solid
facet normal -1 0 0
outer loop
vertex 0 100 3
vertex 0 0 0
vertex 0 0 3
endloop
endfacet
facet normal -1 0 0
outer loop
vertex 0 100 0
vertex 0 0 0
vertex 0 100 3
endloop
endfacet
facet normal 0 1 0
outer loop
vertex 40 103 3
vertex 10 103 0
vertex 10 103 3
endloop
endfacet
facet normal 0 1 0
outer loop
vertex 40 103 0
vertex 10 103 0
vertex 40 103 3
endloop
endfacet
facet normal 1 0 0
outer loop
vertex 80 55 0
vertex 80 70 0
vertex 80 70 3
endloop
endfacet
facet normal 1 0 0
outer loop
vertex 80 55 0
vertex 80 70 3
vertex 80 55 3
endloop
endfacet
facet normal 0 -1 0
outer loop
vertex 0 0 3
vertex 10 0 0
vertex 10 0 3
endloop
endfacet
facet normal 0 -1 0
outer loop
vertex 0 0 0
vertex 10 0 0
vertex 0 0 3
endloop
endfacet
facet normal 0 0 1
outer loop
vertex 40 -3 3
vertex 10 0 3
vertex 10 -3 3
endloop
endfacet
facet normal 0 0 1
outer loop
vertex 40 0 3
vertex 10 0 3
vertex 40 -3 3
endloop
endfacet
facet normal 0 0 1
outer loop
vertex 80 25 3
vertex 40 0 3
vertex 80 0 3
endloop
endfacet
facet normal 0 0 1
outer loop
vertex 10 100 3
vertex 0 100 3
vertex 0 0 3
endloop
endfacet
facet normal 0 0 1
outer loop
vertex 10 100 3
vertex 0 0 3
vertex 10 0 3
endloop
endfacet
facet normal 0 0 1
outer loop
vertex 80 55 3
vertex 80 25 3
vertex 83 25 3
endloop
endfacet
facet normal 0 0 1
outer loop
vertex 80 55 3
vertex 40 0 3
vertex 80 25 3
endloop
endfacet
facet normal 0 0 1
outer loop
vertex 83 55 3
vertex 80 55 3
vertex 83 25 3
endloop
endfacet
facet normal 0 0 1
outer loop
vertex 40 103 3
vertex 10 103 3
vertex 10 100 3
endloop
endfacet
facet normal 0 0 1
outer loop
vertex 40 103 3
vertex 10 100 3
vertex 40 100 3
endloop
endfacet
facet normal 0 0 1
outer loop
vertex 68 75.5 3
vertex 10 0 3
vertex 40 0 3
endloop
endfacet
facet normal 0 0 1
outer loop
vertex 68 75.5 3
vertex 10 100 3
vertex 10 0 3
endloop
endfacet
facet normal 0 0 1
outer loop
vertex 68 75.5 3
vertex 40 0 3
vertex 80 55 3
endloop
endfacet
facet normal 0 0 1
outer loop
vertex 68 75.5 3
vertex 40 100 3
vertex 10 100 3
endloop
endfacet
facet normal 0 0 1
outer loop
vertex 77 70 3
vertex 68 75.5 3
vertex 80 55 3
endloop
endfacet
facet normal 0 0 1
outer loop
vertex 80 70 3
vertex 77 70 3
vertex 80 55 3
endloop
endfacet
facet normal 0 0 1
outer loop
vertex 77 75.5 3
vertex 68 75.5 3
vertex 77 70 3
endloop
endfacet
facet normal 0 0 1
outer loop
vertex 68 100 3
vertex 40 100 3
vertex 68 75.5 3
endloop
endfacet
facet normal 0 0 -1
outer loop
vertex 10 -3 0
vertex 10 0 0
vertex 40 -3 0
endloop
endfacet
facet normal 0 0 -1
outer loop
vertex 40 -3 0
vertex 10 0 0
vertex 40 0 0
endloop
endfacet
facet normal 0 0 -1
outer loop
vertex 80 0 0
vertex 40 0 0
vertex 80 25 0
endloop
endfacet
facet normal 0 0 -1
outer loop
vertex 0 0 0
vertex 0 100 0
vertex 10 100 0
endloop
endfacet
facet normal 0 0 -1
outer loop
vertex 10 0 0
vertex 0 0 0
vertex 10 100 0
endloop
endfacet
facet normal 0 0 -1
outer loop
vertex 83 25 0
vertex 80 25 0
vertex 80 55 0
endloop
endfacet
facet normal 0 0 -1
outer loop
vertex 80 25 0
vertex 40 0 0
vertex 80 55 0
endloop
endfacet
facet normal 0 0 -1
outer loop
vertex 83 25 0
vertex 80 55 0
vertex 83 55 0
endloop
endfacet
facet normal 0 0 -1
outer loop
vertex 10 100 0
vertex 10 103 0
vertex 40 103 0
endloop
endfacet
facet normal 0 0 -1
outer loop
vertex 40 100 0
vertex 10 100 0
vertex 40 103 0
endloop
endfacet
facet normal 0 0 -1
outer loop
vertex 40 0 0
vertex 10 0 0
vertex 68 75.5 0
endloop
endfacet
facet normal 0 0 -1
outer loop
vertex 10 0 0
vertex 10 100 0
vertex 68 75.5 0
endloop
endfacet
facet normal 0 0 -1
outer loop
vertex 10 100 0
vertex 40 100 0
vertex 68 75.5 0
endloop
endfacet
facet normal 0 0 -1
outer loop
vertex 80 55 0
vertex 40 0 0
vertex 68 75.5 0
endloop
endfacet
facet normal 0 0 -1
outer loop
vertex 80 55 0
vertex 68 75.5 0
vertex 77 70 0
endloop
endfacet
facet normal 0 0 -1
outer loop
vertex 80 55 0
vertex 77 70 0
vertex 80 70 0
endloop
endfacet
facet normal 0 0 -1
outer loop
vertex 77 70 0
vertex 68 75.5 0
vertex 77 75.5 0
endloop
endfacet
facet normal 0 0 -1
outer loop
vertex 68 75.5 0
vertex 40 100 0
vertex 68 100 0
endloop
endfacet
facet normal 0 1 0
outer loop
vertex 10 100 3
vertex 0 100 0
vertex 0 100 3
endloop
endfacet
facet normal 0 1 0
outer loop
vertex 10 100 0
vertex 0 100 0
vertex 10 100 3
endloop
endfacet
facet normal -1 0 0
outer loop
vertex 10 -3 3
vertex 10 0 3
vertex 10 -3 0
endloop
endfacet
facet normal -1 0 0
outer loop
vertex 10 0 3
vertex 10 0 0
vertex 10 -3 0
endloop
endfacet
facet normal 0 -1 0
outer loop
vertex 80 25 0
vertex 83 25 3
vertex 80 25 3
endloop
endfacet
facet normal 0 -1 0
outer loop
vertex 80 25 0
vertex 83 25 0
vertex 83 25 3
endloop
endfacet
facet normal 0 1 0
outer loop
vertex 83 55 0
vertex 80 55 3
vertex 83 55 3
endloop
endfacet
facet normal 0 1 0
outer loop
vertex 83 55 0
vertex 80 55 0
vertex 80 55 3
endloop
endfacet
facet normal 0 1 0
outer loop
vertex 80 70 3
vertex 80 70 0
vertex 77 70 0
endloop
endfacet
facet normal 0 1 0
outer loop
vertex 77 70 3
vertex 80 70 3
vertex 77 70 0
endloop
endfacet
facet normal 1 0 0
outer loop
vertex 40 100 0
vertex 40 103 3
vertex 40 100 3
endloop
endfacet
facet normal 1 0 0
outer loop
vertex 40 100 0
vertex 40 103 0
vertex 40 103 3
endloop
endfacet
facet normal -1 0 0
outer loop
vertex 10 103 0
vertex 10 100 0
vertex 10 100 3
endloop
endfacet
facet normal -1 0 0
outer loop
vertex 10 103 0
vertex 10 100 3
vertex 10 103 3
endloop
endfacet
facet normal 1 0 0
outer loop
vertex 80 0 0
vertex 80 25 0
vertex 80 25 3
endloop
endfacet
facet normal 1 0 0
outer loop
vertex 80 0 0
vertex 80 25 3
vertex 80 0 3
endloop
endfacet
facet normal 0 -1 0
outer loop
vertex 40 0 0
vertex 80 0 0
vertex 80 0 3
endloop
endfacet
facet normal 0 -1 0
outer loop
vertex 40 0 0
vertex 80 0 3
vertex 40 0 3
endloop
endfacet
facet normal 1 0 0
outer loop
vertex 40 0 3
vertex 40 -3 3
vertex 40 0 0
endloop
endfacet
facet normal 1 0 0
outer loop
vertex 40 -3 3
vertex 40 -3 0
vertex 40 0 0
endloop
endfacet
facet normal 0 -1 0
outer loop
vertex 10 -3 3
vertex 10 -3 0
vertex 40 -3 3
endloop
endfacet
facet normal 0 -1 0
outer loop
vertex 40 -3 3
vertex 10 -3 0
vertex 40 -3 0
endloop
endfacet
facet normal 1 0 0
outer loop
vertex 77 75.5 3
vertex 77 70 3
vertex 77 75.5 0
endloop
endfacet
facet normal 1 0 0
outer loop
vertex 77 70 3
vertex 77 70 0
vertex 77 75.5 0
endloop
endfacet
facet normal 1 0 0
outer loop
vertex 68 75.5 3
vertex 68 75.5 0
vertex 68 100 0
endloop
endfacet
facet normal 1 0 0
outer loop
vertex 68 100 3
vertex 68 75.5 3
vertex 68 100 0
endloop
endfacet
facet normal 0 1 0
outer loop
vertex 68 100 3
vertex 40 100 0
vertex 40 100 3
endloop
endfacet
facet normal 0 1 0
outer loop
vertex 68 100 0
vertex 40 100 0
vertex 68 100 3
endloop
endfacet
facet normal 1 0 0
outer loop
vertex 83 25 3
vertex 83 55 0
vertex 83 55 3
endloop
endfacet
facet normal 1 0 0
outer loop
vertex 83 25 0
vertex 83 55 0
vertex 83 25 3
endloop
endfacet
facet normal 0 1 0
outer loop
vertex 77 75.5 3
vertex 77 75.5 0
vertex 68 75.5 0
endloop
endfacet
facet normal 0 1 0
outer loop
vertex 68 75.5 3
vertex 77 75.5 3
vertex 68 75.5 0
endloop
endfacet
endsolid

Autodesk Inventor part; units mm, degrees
ref_plane "YZ Plane" through (0, 0, 0) normal (1, 0, 0) x (0, 1, 0)
ref_plane "XZ Plane" through (0, 0, 0) normal (0, 1, 0) x (-1, 0, 0)
ref_plane "XY Plane" through (0, 0, 0) normal (0, 0, 1) x (1, 0, 0)
sketch "Boceto1" plane through (0, 0, 0) normal (0, 0, 1) x (1, 0, 0)
  line L0 (0, 0) -> (0, 100)
  line L1 (80, 55) -> (83, 55)
  line L2 (83, 55) -> (83, 25)
  line L3 (83, 25) -> (80, 25)
  line L4 (80, 70) -> (80, 55)
  line L5 (80, 25) -> (80, 0)
  line L6 (10, 100) -> (10, 103)
  line L7 (10, 103) -> (40, 103)
  line L8 (40, 103) -> (40, 100)
  line L9 (0, 100) -> (10, 100)
  line L10 (40, 100) -> (68, 100)
  line L11 (77, 75.5) -> (68, 75.5)
  line L12 (68, 75.5) -> (68, 100)
  line L13 (10, 0) -> (10, -3)
  line L14 (40, -3) -> (40, 0)
  line L15 (10, -3) -> (40, -3)
  line L16 (80, 0) -> (40, 0)
  line L17 (10, 0) -> (0, 0)
  line L18 (80, 70) -> (77, 70)
  line L19 (77, 70) -> (77, 75.5)
  point P0 (0, 0)
  dimension "d5" = 30
  dimension "d9" = 30
  dimension "d11" = 10
  dimension "d13" = 3
  dimension "d16" = 80
  dimension "d17" = 3
  dimension "d22" = 3
  dimension "d23" = 100
  dimension "d24" = 25
  dimension "d26" = 3
  dimension "d29" = 9
  dimension "d30" = 70
  dimension "d31" = 75.5
extrude "Extrusión1" add sketch "Boceto1" along normal blind 3
properties part number "Celda pared divisora"
